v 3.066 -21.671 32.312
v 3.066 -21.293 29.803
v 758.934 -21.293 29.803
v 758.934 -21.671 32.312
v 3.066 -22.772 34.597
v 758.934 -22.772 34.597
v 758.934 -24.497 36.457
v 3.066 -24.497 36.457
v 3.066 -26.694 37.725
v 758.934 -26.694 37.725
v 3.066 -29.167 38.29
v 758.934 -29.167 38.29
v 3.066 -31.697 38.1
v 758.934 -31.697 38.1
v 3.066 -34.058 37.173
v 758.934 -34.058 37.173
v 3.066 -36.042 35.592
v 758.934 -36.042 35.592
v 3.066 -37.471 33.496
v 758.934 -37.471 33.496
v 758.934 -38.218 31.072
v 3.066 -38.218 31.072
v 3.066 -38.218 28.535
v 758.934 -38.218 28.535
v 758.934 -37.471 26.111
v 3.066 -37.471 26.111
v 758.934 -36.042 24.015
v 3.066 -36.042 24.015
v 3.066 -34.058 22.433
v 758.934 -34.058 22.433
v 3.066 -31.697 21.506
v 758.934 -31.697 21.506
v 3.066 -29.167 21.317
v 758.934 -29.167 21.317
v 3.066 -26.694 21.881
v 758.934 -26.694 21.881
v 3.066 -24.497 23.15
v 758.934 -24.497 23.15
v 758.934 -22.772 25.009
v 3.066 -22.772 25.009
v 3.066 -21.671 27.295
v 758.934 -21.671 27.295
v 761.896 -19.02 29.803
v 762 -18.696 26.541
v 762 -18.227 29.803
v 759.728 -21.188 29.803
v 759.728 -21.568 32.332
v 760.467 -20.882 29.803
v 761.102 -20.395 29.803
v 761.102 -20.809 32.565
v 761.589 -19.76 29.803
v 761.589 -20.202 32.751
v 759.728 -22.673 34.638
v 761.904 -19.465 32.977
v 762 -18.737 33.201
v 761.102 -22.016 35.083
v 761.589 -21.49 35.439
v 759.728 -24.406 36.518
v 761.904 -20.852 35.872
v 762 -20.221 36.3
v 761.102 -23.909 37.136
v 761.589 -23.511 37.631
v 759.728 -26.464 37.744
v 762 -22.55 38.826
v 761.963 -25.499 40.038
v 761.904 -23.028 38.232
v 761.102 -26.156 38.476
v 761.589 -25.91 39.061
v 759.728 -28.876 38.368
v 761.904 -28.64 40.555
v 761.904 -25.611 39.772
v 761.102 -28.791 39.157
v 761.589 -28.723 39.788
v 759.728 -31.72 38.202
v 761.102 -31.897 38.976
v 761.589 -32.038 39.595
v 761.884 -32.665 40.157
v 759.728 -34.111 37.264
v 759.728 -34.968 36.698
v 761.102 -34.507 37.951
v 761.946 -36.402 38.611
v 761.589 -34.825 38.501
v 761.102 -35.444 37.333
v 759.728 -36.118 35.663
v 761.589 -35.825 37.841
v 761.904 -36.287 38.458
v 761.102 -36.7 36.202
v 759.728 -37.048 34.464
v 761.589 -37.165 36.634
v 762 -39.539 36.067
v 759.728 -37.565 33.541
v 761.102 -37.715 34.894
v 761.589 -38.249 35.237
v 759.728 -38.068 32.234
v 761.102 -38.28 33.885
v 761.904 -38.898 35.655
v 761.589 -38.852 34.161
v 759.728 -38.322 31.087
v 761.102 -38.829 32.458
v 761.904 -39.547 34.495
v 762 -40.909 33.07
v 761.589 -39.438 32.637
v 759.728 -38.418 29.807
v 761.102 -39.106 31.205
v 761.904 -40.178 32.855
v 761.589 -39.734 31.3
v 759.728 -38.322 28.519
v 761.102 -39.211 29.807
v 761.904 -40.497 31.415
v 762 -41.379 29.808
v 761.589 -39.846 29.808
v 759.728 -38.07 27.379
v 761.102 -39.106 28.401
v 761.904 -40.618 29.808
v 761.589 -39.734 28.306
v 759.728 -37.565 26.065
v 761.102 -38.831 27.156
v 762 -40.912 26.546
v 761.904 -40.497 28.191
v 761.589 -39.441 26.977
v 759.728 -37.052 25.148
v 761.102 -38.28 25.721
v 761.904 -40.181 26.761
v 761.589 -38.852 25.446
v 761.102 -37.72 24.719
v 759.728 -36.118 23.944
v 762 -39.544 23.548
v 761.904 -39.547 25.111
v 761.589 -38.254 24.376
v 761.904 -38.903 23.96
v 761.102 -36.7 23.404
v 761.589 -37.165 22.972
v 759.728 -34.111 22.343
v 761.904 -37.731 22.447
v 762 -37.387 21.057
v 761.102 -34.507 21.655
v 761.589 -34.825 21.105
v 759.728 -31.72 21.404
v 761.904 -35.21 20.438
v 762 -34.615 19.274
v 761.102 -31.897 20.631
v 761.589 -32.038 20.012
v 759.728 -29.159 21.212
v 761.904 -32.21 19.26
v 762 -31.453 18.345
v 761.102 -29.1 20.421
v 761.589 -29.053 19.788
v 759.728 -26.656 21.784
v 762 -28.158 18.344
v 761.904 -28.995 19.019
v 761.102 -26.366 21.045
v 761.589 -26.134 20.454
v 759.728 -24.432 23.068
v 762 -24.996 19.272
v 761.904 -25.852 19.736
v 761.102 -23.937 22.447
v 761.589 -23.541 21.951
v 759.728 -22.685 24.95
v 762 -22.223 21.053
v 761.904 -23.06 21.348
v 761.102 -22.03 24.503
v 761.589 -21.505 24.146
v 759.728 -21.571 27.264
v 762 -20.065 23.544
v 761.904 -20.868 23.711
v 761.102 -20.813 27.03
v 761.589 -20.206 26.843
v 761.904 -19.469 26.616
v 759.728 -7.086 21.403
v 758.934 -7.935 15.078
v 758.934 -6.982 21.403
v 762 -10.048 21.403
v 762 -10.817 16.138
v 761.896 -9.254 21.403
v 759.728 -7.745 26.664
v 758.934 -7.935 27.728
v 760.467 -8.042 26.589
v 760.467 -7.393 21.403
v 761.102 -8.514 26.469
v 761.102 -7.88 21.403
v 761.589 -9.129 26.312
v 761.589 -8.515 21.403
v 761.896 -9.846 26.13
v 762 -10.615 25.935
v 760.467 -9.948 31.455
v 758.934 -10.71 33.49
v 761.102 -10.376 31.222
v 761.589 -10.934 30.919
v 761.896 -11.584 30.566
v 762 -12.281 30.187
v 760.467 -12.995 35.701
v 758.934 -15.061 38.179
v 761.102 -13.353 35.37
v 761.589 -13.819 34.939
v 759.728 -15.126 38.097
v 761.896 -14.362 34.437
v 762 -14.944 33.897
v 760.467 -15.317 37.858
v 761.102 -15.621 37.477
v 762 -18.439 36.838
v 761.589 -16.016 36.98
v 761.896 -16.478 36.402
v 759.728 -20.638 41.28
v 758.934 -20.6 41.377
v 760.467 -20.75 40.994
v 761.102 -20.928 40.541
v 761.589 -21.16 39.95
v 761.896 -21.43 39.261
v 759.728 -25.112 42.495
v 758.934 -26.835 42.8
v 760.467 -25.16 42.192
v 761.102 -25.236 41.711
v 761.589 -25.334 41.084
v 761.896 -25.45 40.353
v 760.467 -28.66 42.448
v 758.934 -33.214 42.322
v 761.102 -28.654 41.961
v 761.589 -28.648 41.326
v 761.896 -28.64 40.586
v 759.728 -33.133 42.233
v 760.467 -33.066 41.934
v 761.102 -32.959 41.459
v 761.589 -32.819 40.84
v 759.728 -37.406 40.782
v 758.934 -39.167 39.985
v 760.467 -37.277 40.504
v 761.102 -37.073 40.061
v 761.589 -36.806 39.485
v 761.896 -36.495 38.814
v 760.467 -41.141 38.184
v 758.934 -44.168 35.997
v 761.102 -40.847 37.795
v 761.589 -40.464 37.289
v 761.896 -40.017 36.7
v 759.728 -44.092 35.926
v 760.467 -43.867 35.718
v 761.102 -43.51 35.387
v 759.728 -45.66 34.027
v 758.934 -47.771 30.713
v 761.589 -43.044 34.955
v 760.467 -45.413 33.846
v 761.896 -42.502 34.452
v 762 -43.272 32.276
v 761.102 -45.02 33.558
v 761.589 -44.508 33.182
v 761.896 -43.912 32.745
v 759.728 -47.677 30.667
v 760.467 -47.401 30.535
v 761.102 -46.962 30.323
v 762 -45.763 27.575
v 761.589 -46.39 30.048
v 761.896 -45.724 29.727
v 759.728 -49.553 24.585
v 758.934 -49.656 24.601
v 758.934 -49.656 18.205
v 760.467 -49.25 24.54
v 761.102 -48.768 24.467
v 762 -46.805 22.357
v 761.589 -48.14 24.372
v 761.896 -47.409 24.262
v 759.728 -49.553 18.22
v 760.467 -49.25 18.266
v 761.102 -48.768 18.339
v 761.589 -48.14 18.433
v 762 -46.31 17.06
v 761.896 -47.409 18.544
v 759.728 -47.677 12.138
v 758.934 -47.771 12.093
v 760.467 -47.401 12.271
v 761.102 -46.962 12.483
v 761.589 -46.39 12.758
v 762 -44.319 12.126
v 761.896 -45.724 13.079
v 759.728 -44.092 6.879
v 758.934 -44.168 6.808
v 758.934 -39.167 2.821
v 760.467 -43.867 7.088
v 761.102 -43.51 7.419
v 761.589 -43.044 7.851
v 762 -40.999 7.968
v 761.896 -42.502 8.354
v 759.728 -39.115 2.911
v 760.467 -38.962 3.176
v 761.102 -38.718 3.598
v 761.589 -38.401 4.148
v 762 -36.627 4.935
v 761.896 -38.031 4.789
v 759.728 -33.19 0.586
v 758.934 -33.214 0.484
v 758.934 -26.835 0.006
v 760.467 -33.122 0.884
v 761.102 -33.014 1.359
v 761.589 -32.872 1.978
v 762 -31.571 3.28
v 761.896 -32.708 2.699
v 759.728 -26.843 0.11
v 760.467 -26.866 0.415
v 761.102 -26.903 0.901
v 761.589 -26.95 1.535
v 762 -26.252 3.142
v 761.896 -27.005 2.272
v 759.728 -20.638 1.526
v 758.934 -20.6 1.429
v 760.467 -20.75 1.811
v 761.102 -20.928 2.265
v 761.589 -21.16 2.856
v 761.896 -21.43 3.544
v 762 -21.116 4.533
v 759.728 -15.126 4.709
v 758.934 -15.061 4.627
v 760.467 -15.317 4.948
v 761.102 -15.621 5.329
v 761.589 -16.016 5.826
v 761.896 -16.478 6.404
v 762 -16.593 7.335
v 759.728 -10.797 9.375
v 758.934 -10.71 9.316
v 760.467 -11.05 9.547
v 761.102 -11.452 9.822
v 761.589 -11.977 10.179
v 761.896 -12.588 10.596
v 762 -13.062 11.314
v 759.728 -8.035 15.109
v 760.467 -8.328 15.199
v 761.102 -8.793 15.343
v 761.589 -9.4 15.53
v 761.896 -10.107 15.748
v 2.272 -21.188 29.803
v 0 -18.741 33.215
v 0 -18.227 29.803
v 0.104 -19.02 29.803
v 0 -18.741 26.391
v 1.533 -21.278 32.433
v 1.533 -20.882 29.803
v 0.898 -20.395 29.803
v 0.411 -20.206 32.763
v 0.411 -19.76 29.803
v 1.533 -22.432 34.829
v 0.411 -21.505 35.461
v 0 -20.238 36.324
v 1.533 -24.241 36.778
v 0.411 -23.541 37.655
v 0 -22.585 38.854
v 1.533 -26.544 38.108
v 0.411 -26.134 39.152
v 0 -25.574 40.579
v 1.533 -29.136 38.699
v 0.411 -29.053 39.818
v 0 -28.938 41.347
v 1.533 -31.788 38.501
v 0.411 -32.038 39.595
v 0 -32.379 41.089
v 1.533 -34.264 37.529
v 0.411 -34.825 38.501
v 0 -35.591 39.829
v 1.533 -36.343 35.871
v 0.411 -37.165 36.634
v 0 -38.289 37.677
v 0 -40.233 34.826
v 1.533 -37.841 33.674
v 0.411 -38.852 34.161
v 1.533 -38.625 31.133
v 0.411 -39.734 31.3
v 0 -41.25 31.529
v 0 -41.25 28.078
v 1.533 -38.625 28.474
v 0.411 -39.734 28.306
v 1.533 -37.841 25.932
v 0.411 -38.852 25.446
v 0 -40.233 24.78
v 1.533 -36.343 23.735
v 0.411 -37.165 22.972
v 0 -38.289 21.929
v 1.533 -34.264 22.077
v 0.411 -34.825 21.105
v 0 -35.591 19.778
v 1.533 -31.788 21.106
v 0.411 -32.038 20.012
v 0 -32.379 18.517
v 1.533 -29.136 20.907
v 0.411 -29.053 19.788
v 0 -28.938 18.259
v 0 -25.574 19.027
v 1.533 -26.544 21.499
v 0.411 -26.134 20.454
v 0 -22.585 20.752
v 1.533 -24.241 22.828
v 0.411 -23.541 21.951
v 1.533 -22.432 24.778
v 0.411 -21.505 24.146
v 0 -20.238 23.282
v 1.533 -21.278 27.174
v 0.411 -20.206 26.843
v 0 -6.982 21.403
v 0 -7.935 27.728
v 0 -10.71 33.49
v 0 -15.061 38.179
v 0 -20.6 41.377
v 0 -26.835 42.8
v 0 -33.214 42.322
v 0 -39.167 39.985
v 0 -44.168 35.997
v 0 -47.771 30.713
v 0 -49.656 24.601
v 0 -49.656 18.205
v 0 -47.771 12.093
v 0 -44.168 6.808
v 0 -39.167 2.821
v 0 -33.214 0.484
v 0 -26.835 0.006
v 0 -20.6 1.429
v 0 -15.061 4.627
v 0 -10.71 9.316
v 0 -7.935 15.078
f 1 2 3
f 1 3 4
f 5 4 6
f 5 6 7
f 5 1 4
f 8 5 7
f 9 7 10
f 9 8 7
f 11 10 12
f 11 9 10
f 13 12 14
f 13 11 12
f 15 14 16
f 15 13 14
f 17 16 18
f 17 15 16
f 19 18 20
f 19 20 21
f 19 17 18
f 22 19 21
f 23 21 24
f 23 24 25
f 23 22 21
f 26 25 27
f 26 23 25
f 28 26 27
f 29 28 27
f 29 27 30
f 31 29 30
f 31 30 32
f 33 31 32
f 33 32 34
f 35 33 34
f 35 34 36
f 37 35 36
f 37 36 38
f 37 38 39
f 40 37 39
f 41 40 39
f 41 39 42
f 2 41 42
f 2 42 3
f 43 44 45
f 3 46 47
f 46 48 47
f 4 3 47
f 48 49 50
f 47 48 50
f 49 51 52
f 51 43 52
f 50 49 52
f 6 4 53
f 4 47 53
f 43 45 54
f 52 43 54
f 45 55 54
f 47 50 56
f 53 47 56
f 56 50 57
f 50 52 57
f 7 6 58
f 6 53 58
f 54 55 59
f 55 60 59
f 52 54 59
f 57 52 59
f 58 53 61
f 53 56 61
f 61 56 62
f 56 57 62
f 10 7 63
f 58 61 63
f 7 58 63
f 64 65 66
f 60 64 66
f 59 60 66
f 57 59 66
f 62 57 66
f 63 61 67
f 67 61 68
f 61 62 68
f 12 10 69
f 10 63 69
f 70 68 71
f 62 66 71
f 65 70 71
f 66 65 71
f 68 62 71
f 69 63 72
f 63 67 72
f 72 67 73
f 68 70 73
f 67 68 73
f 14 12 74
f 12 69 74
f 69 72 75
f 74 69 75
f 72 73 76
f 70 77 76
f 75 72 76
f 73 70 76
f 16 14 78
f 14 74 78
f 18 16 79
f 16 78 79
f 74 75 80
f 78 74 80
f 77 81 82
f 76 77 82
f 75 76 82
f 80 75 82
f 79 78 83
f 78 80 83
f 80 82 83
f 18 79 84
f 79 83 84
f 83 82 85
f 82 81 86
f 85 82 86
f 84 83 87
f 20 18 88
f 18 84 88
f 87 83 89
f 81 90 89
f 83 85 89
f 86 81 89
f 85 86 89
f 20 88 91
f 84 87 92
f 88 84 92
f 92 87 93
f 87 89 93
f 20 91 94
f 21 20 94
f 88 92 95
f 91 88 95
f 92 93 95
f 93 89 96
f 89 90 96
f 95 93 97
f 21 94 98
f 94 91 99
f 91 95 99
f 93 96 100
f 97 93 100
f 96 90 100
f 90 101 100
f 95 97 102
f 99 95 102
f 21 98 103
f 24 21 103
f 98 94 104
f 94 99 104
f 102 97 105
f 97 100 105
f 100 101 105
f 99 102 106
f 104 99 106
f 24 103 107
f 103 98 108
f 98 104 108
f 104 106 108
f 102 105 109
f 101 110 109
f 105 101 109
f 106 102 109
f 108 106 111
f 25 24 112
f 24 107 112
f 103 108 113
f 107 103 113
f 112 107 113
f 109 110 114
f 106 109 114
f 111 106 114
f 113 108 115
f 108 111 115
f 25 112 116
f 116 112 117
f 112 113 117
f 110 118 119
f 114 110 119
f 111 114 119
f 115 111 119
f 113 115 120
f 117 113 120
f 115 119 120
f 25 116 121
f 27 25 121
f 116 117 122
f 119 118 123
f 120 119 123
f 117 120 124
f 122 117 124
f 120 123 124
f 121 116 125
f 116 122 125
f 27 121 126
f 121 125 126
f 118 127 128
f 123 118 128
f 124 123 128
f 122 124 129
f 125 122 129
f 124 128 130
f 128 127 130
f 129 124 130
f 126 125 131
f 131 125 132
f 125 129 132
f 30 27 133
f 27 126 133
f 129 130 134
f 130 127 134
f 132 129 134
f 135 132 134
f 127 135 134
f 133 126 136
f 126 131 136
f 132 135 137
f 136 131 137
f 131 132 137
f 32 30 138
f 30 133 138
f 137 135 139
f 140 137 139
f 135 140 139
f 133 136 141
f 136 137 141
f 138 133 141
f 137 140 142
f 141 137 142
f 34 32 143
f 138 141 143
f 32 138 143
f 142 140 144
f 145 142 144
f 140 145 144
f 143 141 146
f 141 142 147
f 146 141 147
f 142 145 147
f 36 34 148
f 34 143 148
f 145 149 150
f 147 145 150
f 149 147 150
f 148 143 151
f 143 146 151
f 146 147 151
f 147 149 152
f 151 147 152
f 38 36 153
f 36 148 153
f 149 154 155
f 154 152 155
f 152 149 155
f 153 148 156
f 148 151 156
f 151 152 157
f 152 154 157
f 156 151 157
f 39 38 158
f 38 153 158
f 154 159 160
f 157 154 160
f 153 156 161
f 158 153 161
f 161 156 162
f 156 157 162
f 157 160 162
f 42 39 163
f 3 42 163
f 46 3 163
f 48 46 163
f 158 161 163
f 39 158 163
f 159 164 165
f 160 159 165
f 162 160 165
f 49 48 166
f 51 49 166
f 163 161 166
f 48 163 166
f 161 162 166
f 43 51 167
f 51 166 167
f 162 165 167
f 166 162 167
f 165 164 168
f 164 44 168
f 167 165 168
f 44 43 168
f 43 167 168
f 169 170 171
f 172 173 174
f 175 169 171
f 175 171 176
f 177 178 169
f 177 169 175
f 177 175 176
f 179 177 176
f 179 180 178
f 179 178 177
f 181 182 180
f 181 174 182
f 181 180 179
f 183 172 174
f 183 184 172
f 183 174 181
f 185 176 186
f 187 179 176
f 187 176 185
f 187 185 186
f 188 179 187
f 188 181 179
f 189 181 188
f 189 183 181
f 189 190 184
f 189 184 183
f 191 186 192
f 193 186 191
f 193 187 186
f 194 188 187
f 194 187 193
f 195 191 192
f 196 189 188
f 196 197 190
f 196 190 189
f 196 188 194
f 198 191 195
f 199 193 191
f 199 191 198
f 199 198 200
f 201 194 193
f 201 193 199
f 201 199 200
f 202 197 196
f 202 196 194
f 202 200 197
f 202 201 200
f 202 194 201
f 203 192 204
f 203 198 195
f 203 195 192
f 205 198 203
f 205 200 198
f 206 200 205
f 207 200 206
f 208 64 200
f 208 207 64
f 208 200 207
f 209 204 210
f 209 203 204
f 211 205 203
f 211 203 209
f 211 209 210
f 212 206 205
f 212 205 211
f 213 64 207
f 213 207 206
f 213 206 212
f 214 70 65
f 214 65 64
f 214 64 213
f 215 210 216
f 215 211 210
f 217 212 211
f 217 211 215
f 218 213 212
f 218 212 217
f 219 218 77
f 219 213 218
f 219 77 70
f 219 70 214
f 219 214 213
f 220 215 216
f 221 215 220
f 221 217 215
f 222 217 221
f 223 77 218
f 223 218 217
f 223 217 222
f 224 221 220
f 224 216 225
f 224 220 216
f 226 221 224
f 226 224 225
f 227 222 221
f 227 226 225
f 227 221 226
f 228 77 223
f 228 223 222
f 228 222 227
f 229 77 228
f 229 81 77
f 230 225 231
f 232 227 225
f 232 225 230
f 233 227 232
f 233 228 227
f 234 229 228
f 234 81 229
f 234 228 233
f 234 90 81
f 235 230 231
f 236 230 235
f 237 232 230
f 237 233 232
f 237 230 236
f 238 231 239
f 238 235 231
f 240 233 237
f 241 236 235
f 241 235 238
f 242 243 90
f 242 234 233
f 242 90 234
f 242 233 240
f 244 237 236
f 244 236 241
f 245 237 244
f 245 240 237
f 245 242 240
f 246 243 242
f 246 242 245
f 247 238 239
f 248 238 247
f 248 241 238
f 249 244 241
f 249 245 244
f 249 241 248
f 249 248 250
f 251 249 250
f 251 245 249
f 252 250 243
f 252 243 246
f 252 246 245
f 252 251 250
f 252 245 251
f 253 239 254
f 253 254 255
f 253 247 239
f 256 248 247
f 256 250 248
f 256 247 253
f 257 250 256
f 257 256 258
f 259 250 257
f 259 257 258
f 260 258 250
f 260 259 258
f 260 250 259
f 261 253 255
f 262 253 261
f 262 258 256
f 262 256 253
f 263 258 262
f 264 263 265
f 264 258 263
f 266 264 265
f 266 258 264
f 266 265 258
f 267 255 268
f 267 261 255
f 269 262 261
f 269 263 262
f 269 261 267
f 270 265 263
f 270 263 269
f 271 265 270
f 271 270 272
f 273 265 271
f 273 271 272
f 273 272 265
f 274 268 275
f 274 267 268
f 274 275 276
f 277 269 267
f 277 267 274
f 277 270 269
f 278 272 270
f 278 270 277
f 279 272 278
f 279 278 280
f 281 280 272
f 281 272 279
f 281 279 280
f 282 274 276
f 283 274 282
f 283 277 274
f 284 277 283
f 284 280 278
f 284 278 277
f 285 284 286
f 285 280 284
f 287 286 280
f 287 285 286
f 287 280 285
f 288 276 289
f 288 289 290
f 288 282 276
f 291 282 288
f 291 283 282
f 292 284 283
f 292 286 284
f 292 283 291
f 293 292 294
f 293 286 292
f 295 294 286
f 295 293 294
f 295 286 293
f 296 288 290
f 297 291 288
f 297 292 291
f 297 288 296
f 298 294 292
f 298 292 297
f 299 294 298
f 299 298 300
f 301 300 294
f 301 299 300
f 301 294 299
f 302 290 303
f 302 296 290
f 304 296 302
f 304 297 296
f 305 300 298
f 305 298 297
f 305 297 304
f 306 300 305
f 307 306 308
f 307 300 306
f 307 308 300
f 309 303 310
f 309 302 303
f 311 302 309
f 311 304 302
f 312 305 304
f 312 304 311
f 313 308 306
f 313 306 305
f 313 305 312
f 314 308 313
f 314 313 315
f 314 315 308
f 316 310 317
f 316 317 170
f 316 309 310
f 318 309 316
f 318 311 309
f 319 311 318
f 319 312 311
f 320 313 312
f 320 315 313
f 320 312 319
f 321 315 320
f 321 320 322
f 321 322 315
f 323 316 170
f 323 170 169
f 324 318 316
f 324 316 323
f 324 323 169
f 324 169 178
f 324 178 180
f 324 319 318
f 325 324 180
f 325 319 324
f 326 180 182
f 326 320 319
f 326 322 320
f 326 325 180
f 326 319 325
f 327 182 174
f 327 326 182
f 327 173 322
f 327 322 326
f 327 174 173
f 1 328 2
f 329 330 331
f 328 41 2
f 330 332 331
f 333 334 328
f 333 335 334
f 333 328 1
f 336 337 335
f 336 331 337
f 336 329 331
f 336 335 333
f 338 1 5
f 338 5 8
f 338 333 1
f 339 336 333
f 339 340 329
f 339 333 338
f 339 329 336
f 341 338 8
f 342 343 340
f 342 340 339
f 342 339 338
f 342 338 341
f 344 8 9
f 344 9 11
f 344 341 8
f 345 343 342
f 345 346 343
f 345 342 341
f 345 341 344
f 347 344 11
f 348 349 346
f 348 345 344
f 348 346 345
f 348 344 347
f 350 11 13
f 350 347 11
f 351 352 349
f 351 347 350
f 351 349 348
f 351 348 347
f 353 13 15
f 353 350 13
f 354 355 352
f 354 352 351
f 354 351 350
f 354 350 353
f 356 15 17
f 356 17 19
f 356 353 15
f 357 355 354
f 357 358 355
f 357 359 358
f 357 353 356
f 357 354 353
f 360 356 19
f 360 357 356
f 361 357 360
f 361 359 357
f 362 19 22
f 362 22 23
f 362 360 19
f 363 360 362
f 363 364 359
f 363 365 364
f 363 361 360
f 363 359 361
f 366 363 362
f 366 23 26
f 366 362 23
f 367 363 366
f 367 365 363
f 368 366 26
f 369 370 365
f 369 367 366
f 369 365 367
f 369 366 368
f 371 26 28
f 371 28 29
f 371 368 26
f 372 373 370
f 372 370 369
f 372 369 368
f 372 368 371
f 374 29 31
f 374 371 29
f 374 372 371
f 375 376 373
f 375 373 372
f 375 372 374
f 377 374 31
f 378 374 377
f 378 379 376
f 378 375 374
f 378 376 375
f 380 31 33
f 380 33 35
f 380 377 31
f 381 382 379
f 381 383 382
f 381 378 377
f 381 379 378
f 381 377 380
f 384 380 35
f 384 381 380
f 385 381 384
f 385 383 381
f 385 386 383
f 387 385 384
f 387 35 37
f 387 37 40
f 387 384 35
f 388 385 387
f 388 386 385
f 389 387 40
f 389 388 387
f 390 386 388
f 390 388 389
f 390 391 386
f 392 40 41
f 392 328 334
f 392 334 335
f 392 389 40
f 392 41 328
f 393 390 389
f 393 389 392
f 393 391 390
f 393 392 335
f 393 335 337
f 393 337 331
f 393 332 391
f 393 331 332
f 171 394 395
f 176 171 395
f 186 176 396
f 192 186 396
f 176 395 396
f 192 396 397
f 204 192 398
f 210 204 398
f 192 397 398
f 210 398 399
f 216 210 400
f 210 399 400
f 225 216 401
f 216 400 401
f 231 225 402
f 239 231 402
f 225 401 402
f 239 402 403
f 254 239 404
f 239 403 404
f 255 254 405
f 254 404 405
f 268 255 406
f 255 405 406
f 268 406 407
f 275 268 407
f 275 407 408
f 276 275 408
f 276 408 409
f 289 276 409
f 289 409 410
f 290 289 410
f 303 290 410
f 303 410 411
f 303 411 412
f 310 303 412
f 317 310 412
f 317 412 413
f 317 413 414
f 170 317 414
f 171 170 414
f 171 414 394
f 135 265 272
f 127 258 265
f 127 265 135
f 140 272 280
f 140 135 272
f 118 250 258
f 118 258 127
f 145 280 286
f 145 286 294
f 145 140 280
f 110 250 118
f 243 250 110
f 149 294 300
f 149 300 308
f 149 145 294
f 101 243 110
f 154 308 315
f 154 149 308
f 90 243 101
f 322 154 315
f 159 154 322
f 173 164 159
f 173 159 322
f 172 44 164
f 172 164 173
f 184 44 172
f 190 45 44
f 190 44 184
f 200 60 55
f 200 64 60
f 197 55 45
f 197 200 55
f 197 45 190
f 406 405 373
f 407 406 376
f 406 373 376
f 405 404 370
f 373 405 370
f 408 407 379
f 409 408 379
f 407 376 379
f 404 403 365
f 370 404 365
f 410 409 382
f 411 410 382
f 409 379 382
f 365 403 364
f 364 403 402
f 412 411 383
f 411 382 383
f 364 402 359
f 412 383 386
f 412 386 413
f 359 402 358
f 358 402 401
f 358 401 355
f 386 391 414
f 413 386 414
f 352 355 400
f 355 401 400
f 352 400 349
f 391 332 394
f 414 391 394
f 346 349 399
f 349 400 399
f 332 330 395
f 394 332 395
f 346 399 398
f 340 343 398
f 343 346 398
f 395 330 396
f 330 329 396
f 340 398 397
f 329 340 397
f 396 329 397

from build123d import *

# Parameters (mm, degrees)
F0_R     = 21.4571011733
F0_R_2   = 8.5102706454
F1_DEPTH = 762


# Not quite as in the source:
# - a fillet or chamfer that OpenCascade refuses, or shapes differently, is made with other operations: its cross-section is extruded or revolved along the edge and cut away or added


with BuildPart() as f1:
    # F0 (on Right) → F1 (new body)
    with BuildSketch(Plane.YZ):
        with Locations((-28.4389311976, 21.4029382453)):
            Circle(F0_R)
        with Locations((-29.8031512648, 29.8031531274)):
            Circle(F0_R_2, mode=Mode.SUBTRACT)
    extrude(amount=F1_DEPTH)

    # F2: fillet of radius 3.0660512242 on 4 edges, made by hand


with BuildPart() as f2_tool1:
    # F2_s2 → F2_t3 (revolve)
    with BuildSketch(Plane.XY.offset(21.4029382453)):
        with BuildLine():
            ThreePointArc((758.9339487758, -6.9818300243), (761.1019743879, -7.8798556364), (762, -10.0478812485))
            Line((762, -10.0478812485), (762, -6.9818300243))
            Line((762, -6.9818300243), (758.9339487758, -6.9818300243))
        make_face()
    revolve(axis=Axis((762, -28.4389311976, 21.4029382453), (1, 0, 0)))


with BuildPart() as f2_tool4:
    # F2_s5 → F2_t6 (revolve)
    with BuildSketch(Plane.XY.offset(29.8031531274)):
        with BuildLine():
            ThreePointArc((758.9339487758, -21.2928806194), (761.1019743879, -20.3948550073), (762, -18.2268293951))
            Line((762, -18.2268293951), (762, -21.2928806194))
            Line((762, -21.2928806194), (758.9339487758, -21.2928806194))
        make_face()
    revolve(axis=Axis((762, -29.8031512648, 29.8031531274), (1, 0, 0)))


with BuildPart() as f2_tool7:
    # F2_s8 → F2_t9 (revolve)
    with BuildSketch(Plane.XY.offset(29.8031531274)):
        with BuildLine():
            ThreePointArc((3.0660512242, -21.2928806194), (0.8980256121, -20.3948550073), (0, -18.2268293951))
            Line((0, -18.2268293951), (0, -21.2928806194))
            Line((0, -21.2928806194), (3.0660512242, -21.2928806194))
        make_face()
    revolve(axis=Axis((0, -29.8031512648, 29.8031531274), (1, 0, 0)))


with BuildPart() as f1_1:
    add(f1.part)

    # F2_t10: cut F2_tool1, F2_tool4, F2_tool7
    add([f2_tool1.part, f2_tool4.part, f2_tool7.part], mode=Mode.SUBTRACT)


solid = f1_1.part
